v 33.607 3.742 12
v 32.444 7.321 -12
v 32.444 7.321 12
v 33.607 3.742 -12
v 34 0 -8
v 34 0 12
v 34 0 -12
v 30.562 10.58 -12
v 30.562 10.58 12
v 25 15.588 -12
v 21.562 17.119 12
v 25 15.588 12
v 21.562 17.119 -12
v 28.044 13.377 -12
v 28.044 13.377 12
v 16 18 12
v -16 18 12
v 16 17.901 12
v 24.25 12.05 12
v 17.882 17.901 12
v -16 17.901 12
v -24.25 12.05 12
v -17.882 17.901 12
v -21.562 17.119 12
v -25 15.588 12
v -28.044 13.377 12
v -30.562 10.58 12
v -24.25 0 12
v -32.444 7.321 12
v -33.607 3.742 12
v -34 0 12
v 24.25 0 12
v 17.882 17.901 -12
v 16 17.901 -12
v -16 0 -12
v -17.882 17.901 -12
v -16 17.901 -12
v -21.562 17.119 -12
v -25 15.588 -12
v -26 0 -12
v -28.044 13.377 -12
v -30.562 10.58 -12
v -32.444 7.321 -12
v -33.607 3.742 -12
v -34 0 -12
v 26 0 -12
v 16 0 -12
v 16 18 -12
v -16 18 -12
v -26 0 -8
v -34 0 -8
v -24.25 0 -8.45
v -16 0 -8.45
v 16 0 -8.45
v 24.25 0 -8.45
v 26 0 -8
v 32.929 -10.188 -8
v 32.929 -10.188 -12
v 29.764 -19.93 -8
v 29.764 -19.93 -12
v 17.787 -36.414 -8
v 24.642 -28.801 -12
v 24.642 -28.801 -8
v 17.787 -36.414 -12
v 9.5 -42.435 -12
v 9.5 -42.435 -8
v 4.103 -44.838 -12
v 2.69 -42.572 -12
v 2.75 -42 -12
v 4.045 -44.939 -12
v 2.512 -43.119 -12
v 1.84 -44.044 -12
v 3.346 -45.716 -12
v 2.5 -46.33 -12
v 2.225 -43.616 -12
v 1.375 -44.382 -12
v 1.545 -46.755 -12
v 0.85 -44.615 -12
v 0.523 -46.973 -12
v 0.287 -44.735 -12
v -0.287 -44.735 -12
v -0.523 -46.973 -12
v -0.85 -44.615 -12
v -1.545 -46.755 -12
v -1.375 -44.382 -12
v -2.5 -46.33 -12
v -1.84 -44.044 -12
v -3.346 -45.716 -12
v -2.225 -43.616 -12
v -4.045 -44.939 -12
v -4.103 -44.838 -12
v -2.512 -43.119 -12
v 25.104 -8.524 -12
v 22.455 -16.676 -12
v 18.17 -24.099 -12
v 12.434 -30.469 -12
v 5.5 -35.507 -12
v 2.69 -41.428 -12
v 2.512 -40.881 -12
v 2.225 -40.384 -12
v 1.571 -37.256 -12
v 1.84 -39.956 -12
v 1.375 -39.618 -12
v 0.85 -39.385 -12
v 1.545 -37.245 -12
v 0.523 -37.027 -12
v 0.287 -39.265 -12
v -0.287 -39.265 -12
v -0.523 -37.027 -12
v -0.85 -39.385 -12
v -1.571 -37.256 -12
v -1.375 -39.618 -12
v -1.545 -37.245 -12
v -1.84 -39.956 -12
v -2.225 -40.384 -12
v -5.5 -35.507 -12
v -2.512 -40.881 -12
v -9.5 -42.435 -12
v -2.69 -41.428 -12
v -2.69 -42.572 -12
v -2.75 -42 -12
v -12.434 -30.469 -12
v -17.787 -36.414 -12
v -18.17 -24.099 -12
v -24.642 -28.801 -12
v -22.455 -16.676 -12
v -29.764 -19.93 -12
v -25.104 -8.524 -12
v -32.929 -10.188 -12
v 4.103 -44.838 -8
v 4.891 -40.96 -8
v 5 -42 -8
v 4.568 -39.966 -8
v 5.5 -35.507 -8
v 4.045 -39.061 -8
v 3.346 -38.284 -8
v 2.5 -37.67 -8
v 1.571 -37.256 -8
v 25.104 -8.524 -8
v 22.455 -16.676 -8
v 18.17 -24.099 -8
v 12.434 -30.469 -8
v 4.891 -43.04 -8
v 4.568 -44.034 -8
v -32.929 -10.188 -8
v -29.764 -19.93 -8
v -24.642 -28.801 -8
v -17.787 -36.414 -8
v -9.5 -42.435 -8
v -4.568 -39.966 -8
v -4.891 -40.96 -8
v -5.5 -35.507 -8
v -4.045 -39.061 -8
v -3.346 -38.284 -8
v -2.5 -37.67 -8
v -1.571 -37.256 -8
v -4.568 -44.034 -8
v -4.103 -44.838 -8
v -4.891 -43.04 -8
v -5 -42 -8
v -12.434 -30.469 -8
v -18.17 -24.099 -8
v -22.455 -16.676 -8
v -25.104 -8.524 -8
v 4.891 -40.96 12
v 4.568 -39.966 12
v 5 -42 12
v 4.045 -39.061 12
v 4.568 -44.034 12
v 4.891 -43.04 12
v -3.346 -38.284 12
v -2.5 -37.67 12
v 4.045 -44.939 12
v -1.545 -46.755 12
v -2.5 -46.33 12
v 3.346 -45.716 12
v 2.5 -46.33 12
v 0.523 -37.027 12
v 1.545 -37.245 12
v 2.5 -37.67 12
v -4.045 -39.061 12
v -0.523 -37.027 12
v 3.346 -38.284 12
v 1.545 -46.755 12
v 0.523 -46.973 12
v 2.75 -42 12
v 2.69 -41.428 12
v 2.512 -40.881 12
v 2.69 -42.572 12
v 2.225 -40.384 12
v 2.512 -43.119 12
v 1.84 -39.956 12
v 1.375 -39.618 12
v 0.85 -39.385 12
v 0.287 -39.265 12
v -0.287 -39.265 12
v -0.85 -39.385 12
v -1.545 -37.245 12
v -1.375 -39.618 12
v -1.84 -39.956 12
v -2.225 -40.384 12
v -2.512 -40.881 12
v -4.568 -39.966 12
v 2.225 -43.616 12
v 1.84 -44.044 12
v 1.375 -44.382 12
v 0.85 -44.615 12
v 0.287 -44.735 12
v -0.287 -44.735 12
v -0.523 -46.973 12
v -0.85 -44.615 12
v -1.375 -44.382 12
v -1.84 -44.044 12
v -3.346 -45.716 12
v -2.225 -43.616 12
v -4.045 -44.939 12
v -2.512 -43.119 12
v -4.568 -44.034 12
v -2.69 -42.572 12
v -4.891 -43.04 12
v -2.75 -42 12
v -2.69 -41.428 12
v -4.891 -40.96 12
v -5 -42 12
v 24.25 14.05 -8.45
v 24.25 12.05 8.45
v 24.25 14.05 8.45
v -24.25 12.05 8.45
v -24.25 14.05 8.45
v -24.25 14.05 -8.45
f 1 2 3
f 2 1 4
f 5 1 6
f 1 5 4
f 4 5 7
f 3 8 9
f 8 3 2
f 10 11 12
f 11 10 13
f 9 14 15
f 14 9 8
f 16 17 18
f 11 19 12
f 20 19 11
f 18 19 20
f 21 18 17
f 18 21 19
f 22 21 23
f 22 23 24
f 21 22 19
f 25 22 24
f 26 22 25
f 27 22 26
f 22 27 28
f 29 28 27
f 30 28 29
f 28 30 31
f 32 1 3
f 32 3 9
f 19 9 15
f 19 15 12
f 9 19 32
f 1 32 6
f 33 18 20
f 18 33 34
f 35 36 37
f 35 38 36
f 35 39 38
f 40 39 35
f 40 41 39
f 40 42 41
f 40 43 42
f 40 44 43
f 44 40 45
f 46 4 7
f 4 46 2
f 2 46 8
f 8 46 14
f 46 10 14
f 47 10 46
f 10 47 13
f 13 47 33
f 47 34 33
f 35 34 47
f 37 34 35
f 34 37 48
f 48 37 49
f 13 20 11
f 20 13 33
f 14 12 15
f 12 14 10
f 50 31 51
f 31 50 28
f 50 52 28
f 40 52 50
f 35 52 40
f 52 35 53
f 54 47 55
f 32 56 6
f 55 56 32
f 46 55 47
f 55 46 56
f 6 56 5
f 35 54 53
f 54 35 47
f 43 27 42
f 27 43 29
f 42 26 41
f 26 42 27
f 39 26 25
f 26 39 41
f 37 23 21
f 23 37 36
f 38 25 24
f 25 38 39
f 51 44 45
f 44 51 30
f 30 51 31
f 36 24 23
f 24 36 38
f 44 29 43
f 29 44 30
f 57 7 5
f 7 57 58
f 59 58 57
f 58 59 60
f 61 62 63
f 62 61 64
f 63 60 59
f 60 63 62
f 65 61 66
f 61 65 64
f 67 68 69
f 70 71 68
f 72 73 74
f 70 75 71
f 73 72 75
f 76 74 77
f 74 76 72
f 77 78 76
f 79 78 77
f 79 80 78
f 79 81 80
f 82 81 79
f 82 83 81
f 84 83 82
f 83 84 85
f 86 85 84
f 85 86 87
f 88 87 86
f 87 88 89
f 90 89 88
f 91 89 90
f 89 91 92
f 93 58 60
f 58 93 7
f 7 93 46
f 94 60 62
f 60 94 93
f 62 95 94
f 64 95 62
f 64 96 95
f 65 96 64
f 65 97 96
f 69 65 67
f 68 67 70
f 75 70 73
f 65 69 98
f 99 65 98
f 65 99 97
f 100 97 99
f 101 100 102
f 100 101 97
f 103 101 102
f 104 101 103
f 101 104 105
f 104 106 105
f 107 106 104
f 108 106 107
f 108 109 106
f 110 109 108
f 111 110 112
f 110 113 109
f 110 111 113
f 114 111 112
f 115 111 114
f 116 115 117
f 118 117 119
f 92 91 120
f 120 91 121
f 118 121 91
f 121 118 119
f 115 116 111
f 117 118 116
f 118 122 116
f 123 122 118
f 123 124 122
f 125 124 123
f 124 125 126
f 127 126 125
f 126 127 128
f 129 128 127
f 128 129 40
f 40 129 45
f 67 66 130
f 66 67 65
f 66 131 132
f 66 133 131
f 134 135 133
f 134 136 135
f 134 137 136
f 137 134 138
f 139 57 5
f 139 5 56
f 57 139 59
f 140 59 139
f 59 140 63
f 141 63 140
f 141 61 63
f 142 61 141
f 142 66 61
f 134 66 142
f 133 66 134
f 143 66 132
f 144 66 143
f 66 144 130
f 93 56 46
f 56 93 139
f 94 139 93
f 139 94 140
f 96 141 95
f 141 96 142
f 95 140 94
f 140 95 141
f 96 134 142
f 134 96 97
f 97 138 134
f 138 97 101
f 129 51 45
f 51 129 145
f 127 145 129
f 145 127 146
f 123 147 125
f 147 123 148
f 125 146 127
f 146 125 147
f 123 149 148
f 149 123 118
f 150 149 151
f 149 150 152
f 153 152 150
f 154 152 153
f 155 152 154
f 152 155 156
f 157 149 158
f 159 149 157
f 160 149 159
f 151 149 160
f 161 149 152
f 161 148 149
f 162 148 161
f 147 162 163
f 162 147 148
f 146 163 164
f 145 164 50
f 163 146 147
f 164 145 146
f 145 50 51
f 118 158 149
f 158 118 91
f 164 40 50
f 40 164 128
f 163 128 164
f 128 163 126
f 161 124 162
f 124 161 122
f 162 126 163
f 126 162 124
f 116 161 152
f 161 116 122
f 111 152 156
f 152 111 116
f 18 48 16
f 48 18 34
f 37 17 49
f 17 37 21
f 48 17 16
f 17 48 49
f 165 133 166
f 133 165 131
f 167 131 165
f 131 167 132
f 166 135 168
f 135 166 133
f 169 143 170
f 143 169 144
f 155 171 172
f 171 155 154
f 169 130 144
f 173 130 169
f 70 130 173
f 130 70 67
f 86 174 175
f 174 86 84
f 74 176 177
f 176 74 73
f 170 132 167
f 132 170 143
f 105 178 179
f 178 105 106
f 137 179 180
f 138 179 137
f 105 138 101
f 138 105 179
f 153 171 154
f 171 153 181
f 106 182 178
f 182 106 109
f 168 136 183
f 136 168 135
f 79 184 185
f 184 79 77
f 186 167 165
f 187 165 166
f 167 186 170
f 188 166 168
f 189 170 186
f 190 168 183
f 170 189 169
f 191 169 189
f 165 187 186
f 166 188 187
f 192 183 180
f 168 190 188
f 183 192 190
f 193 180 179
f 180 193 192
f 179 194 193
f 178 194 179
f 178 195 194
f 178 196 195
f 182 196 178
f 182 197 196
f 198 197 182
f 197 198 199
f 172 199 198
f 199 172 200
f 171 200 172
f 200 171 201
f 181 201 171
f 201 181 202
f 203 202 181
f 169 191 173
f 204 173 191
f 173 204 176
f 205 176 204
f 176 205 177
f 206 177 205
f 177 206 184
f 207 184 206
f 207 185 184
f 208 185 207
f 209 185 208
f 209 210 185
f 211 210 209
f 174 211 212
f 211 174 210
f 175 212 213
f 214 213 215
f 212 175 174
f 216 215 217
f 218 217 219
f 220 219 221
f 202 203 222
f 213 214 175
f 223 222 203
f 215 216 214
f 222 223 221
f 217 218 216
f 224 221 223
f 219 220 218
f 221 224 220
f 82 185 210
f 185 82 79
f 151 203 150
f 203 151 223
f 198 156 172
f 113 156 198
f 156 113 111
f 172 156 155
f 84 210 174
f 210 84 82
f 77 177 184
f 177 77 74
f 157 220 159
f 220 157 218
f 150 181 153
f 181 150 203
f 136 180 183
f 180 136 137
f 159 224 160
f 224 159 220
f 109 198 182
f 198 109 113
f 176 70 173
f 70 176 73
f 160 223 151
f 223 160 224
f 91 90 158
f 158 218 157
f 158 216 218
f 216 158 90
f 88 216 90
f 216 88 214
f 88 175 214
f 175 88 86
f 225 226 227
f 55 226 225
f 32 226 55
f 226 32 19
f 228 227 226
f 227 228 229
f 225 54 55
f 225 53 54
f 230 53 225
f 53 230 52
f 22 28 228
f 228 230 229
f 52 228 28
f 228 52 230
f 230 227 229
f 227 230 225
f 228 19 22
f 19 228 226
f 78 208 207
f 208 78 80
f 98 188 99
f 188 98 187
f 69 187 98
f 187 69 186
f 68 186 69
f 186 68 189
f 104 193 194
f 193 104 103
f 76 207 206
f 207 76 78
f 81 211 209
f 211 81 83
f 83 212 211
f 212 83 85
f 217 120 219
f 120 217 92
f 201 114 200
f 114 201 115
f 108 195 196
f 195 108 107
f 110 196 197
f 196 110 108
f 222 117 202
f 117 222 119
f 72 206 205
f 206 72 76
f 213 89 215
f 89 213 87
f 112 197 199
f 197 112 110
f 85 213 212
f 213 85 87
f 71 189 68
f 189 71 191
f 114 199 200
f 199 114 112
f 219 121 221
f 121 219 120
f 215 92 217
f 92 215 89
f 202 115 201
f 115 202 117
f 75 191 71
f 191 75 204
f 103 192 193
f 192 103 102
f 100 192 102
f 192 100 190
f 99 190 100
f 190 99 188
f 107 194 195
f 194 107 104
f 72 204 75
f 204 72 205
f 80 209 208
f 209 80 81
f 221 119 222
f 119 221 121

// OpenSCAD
$fn=30*1.0;

// inner seat placement information
inner_length = 48.0 + 0.5;
inner_width = 15.9 + 1.0;
depth = 14.0;

// bucket dimmensions
total_width = 24.0;
bottom_radius = 18.0;
bottom_spacing = 16;

//bucket top settings
top_angle = 71;
top_radius_add = 15;
top_thickness = 8;
top_width = 4;

//hole setting
hole_radius = 5.5/2;
hole_radius1 = 10/2;
hole_height = 42;

module half_cylinder(radius,height,flip=-1)
{
    difference()
    {
        cylinder(r=radius,h=height, center=true);
        translate([0,flip*radius/2,0]) cube([radius*2,radius,height+0.1],center=true);
    }
}


module angle_section(radius,height,thickness, angle=90)
{
    difference()
    {
        cylinder(r=radius,h=height, center=true);
        cylinder(r=radius-thickness,h=height+0.1, center=true);
        translate([0,radius/2,0]) cube([radius*2,radius,height+0.1],center=true);
        rotate([0,0,180-angle]) translate([0,radius/2,0]) cube([radius*2,radius,height+0.1],center=true);
    }
}

module bucket()
{
    
    difference()
    {
        union()
        {
            // bottom section
            translate([bottom_spacing,0,0]) half_cylinder(bottom_radius,total_width);
            translate([-bottom_spacing,0,0]) half_cylinder(bottom_radius,total_width);
            translate([0,bottom_radius/2,0]) cube([bottom_spacing*2,bottom_radius,total_width],center=true);
            // top section
            translate([-top_radius_add,0,-(total_width-top_thickness/2)/2]) angle_section(bottom_radius+bottom_spacing+top_radius_add,top_width,top_thickness,top_angle);
            translate([0,0,-(total_width-top_thickness/2)/2]) rotate([0,180,0]) translate([-top_radius_add,0,0]) angle_section(bottom_radius+bottom_spacing+top_radius_add,top_width,top_thickness,top_angle);
            // hole cutout
            translate([0,-hole_height,0]) cylinder(r=hole_radius1,h=total_width, center=true);
        }
        //seat cutout
        translate([0,depth/2,0]) cube([inner_length,depth+0.1,inner_width],center=true);
        // seat door cutout
        translate([0,depth/2-2,5]) cube([inner_length,depth+0.1,inner_width],center=true);
        // hole cutout
        translate([0,-hole_height,0]) cylinder(r=hole_radius,h=total_width+0.1, center=true);
        half_cylinder(bottom_radius+bottom_spacing-8,total_width+0.1,1);
    }
    
}

// Parameters modified for best print on my Replicator 2 with PLA
Pitch = 8*1.0;
Radius1 = 5.1/2;
Radius2 = 6.2/2;//6.5/2;
Height = 7.8*1.0;
Depth = 0.85*1.0;
Width = 7.3*1.0; 

module technic_cutout()
{
    union()
    {
        translate([0,0,-(Height-Depth+0.1)/2]) cylinder(r=Radius2,h=Depth+0.1, center=true);
        cylinder(r=Radius1,h=Height+0.1, center=true);
        translate([0,0,(Height-Depth+0.1)/2]) cylinder(r=Radius2,h=Depth+0.1, center=true);
    }
}



module beam(Holes = 9, thickness = Height)
{
    Length = (Holes-1) * Pitch;
    union()
	{			
        translate([Length/2,0,0]) cube([Length, Width, thickness], center=true);
        cylinder(r=Width/2, h=thickness, center=true);
        translate([(Holes-1)*Pitch, 0,0]) cylinder(r=Width/2, h=thickness, center=true);
	}
}
module drawBeamHoles(Holes = 9)
{
    for (i = [1:Holes])
    {
        translate([(i-1)*Pitch, 0,0]) technic_cutout();
    }
}


module drawBeam(Holes = 9)
{
    Length = (Holes-1) * Pitch;
    difference()
    {
        beam(Holes);
        drawBeamHoles(Holes);
    }
}


module SegmentBeam(end1=3,middle=7,end2=1)
{
    difference()
    {
        union()
        {
            translate([0,0,-Height/4]) beam(end1+middle+end2, Height/2);
            beam(end1, Height);
            translate([(end1+middle)*Pitch,0,0]) beam(end2, Height);
        }
        drawBeamHoles(end1);
        translate([(end1+middle)*Pitch,0,0]) drawBeamHoles(end2);
    }
}
bucket();
